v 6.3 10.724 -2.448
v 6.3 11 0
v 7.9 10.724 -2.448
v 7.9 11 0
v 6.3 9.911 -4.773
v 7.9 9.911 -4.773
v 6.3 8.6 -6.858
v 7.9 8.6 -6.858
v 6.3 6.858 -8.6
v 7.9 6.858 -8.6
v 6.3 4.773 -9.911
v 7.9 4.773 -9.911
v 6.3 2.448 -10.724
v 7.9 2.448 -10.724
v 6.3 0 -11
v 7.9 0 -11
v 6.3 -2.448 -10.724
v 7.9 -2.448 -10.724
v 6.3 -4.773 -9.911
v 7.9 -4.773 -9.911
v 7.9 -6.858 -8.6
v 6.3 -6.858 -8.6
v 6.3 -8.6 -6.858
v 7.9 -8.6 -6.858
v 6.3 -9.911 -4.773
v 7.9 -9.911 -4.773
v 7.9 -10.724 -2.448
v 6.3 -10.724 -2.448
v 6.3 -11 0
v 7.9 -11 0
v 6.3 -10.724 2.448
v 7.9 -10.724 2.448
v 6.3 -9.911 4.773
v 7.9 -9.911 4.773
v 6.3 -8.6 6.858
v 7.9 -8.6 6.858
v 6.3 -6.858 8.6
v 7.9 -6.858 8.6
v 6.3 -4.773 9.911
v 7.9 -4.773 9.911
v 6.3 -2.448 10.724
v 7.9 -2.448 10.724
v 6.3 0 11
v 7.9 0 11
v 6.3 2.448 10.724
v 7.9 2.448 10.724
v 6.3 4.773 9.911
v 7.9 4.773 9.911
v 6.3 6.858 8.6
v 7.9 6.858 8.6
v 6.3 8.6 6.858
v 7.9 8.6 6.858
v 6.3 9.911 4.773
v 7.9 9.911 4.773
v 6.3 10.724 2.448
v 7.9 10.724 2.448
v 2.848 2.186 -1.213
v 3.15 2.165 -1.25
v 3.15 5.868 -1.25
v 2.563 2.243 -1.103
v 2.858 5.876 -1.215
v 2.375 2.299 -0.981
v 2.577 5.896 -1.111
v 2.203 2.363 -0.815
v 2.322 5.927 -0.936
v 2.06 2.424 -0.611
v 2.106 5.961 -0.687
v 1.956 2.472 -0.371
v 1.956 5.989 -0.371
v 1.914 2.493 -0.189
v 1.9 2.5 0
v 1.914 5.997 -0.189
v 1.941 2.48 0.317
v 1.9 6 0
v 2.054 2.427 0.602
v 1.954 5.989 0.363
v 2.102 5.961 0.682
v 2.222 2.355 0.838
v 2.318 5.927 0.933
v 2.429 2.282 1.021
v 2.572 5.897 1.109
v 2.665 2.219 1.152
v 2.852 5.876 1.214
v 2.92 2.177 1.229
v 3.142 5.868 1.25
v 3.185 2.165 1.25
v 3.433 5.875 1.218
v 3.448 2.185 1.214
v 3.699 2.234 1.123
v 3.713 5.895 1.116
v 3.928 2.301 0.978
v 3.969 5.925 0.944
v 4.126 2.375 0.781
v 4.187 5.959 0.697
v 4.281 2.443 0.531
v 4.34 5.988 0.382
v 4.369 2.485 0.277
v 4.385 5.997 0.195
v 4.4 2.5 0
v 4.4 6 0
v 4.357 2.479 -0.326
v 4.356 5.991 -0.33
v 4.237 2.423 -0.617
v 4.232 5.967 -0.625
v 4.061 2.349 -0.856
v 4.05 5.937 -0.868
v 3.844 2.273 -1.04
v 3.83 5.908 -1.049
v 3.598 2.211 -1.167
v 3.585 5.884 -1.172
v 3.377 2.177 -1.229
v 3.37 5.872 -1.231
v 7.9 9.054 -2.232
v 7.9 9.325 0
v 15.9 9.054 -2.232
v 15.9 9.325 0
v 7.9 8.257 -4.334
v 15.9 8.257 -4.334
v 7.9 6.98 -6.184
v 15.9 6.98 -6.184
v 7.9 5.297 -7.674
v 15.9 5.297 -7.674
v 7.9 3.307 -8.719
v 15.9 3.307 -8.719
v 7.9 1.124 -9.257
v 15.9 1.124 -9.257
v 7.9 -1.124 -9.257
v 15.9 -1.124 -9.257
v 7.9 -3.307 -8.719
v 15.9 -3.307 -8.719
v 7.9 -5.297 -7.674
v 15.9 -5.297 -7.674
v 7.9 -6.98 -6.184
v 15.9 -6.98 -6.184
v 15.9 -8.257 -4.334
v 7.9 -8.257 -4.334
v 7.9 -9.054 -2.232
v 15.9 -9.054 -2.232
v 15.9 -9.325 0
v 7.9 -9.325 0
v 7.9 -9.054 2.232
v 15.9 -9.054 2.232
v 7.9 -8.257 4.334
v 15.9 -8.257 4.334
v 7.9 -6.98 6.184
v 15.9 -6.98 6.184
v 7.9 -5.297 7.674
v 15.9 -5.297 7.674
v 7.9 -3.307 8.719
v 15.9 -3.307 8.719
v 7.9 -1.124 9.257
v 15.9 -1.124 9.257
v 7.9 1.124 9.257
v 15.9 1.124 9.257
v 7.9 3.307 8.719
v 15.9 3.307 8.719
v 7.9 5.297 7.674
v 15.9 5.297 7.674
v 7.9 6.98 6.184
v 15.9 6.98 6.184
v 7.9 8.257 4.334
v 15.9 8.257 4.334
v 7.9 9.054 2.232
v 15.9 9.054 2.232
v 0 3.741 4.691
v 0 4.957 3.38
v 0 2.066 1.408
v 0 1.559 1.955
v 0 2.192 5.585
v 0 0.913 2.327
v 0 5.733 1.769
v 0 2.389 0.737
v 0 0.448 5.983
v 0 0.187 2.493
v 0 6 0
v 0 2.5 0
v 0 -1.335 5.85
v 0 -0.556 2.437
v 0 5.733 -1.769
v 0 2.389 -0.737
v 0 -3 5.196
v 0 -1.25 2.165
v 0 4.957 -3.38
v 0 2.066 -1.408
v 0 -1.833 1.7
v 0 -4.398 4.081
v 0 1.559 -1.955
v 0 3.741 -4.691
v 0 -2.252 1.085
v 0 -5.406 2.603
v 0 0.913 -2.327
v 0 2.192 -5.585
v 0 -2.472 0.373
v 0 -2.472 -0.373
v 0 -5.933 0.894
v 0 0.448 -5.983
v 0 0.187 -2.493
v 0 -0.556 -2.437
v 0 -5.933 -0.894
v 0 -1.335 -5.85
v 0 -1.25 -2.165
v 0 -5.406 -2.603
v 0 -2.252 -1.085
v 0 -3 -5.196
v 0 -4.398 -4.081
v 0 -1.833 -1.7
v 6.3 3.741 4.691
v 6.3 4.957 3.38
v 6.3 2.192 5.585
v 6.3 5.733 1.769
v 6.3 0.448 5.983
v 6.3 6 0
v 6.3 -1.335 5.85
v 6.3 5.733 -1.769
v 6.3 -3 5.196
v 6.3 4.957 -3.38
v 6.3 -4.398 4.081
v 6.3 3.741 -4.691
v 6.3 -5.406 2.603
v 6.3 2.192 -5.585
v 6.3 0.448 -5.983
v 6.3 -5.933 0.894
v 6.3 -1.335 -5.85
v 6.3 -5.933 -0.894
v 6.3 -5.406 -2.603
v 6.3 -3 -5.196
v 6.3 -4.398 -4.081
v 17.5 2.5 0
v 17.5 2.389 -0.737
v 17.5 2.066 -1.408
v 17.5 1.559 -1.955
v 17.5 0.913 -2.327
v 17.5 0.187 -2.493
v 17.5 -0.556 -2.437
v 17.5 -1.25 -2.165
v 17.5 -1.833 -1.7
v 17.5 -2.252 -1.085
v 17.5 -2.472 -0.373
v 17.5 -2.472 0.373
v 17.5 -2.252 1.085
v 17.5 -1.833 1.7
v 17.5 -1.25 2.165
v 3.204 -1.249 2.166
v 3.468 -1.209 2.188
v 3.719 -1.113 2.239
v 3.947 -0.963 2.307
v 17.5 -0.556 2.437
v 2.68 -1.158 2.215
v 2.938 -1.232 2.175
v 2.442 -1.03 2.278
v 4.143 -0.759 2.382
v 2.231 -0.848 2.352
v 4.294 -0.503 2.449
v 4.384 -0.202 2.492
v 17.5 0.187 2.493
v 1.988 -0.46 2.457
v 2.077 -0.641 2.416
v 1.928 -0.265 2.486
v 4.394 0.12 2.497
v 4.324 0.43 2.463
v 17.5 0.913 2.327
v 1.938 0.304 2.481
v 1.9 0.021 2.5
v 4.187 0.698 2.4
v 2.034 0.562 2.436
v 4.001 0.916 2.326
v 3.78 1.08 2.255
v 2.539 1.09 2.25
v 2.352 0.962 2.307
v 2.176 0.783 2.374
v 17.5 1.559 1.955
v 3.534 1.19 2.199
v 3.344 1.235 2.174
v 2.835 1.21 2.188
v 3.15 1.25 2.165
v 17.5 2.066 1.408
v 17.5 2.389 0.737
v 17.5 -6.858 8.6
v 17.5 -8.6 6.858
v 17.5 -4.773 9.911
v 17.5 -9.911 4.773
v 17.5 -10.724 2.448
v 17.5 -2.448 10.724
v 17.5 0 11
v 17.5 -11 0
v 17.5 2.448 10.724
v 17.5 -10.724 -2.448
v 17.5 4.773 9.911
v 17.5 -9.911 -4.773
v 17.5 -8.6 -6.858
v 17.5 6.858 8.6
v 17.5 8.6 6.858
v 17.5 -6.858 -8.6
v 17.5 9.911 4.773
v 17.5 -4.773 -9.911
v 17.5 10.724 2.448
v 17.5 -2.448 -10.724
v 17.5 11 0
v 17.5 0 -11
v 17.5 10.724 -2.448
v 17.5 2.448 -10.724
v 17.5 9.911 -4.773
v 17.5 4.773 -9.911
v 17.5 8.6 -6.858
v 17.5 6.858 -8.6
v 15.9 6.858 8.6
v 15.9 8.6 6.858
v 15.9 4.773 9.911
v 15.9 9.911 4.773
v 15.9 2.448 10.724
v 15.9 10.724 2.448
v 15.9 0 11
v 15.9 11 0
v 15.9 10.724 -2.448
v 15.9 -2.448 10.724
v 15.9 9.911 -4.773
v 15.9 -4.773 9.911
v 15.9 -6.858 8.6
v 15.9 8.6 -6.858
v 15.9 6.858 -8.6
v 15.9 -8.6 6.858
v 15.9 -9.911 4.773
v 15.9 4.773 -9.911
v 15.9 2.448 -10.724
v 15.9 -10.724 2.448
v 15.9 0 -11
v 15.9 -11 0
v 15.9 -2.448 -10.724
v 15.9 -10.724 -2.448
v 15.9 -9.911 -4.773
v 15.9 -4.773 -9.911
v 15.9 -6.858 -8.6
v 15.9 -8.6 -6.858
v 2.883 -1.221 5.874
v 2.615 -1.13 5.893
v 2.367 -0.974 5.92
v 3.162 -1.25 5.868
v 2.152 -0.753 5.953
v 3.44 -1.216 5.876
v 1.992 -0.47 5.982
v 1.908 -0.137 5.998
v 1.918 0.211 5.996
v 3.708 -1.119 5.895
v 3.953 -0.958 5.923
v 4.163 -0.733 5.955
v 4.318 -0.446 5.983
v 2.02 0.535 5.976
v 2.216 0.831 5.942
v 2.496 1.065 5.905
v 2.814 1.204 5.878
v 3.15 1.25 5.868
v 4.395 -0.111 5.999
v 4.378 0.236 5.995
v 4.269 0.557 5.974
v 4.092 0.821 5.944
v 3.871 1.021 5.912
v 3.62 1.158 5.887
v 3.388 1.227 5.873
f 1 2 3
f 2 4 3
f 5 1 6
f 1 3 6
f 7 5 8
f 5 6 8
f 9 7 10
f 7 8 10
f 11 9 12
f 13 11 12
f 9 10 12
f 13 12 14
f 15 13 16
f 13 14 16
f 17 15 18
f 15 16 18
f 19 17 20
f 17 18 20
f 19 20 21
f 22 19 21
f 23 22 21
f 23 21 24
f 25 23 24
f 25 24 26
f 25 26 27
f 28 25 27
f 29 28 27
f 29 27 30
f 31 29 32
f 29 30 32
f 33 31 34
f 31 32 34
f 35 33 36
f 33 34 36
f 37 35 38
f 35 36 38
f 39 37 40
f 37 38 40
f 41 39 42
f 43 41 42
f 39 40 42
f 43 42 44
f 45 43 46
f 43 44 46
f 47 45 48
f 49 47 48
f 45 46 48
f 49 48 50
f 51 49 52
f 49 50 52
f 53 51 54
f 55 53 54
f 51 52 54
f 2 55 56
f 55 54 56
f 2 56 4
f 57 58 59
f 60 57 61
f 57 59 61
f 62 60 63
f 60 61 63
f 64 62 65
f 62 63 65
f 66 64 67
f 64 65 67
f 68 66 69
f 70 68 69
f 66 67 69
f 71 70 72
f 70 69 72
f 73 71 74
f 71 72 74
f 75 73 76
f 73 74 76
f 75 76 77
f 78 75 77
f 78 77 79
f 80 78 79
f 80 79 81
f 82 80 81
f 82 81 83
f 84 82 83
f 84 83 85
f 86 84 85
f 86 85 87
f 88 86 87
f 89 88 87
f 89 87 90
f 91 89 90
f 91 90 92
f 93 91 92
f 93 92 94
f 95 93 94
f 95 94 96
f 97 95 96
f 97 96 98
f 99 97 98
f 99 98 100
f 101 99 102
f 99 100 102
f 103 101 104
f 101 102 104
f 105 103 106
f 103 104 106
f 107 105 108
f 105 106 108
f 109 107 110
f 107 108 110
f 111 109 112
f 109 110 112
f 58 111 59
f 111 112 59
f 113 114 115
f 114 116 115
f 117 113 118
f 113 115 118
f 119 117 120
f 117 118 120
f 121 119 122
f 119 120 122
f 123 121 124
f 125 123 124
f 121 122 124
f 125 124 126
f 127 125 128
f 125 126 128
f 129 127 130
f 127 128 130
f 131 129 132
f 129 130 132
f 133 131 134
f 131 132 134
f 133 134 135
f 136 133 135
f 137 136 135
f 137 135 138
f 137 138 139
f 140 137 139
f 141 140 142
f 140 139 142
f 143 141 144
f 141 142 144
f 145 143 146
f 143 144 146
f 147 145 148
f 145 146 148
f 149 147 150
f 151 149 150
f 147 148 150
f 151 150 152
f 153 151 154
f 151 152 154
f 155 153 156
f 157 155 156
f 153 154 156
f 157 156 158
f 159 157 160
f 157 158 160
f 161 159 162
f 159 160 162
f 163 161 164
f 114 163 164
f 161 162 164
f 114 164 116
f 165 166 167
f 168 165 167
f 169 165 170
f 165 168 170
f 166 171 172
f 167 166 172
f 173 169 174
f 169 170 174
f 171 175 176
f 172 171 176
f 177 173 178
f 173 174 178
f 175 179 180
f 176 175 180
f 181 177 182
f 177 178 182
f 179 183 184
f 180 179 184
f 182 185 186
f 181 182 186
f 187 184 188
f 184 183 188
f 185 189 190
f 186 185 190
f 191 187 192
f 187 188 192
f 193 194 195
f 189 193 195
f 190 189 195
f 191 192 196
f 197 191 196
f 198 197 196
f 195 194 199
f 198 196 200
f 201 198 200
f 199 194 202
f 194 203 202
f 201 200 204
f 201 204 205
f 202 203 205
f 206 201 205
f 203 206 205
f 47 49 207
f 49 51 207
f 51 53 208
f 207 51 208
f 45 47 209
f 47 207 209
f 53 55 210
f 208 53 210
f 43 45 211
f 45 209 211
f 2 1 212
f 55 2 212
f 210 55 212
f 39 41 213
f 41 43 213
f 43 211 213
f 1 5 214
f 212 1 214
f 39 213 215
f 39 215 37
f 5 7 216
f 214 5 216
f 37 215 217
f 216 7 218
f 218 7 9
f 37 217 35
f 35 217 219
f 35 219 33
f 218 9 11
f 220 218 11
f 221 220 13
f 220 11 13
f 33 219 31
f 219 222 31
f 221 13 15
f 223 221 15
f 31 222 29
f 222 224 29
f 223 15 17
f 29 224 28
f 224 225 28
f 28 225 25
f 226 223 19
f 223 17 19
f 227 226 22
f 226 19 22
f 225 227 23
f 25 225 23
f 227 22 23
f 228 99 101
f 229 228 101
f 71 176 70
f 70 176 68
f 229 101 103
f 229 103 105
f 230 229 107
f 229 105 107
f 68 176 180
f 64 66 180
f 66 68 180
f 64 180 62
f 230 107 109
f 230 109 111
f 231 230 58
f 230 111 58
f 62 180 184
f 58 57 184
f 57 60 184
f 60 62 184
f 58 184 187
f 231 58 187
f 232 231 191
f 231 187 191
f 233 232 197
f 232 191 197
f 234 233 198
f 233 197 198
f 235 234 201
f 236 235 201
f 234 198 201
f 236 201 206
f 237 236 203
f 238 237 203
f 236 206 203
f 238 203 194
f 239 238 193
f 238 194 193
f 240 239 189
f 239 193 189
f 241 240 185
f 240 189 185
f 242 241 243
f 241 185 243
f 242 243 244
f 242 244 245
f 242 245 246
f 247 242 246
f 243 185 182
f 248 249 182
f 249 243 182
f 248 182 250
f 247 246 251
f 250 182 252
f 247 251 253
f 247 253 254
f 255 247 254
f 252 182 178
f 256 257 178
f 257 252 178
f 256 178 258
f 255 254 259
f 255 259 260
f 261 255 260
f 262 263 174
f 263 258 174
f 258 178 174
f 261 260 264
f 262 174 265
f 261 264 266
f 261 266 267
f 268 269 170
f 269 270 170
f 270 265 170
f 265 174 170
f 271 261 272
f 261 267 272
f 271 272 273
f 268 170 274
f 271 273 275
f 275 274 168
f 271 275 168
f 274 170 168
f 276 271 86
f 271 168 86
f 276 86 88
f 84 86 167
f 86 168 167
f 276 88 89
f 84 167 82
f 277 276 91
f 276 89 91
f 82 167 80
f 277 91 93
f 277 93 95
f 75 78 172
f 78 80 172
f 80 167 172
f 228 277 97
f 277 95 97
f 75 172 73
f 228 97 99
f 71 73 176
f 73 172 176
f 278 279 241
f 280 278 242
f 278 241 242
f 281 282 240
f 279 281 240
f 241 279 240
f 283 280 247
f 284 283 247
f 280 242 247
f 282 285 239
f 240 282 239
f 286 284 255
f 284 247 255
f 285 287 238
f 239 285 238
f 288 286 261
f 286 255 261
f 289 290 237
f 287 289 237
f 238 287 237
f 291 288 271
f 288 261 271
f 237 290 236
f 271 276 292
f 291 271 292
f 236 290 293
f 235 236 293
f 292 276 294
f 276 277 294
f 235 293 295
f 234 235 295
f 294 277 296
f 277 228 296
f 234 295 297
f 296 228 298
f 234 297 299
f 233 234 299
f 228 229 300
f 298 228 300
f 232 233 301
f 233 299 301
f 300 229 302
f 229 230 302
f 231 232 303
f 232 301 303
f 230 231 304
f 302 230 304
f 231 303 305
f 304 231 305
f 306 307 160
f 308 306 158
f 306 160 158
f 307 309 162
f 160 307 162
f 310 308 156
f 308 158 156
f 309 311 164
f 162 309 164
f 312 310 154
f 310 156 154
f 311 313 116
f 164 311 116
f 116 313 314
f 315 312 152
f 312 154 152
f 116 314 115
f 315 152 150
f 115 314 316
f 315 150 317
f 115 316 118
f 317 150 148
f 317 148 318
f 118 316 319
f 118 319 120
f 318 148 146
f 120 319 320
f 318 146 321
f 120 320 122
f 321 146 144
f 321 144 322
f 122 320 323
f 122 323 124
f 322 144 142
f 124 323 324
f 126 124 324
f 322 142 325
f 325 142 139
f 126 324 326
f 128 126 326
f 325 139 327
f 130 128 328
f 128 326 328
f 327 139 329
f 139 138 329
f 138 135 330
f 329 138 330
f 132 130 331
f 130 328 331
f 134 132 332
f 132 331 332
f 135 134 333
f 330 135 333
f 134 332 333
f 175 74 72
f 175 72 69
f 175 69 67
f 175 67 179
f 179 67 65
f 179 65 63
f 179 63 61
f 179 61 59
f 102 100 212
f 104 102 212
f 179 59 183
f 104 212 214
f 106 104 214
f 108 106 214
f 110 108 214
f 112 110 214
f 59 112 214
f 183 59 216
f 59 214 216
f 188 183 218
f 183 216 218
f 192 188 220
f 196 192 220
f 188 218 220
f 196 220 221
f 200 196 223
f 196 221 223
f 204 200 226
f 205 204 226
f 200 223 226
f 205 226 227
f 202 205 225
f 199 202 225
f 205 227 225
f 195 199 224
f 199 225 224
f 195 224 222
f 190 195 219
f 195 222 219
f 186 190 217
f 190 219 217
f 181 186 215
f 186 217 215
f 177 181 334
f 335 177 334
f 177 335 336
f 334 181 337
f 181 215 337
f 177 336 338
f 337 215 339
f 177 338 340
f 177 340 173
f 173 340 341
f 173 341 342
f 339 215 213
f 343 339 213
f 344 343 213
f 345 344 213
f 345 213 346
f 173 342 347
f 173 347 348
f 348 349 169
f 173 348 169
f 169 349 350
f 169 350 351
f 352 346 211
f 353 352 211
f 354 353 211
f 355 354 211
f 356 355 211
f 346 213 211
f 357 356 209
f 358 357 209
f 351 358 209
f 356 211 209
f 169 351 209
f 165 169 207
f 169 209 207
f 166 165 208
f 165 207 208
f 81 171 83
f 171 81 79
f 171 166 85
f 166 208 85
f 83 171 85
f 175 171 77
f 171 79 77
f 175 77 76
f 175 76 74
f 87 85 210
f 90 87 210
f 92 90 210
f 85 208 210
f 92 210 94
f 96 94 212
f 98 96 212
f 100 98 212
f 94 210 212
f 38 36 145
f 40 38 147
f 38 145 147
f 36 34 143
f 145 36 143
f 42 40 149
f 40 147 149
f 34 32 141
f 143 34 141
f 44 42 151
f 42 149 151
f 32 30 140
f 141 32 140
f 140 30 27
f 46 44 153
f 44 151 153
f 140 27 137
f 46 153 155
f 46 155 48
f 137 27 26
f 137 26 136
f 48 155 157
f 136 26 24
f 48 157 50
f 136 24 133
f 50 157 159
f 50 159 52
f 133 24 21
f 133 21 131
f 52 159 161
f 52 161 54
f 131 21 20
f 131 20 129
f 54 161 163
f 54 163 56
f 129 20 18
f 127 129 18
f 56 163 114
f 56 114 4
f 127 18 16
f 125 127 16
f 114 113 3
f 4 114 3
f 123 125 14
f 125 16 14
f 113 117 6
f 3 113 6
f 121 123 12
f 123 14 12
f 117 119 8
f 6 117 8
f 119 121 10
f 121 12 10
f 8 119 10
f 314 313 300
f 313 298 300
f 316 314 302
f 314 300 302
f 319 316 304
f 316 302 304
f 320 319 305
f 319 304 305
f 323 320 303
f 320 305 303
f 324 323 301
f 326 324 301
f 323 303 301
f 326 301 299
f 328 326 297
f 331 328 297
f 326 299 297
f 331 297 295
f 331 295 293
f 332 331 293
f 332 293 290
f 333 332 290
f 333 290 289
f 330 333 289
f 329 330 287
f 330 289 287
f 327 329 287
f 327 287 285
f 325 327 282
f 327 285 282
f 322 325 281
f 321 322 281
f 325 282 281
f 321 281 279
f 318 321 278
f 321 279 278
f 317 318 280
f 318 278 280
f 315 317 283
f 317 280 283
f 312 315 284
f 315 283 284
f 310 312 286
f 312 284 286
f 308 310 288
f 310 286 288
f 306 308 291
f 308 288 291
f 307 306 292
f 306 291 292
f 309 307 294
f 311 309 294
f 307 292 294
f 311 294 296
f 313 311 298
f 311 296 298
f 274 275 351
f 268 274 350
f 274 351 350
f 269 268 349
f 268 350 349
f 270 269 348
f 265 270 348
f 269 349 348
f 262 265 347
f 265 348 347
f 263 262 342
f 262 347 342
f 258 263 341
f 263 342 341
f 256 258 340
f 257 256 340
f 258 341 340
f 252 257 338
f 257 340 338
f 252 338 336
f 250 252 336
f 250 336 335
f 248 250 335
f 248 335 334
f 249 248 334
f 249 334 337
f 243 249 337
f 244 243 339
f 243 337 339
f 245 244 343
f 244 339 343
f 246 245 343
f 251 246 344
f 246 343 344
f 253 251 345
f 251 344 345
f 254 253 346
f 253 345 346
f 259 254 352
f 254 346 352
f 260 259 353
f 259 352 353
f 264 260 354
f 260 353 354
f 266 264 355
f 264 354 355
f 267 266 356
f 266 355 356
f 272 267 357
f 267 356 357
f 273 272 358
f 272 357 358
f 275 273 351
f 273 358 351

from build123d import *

# Parameters (mm, degrees)
SKETCH2_W = 1.25
SKETCH2_H = 11
SKETCH4_W = 1.25
SKETCH4_H = 11


with BuildPart() as part:
    # Sketch1 → Revolve1 (revolve)
    with BuildSketch(Plane.XY):
        Polygon((0, 2.5), (0, 6), (6.3, 6), (6.3, 11), (7.9, 11), (7.9, 9.325), (15.9, 9.325), (15.9, 11), (17.5, 11), (17.5, 2.5), align=None)
    revolve(axis=Axis((0, 0, 0), (-1, 0, 0)))

    # Sketch2 → M3x0.5 Tapped Hole1 (revolve, cut)
    with BuildSketch(Plane(origin=(3.15, 0, 0), x_dir=(0, 0, -1), z_dir=(1, 0, 0))):
        with Locations((0.625, 5.5)):
            Rectangle(SKETCH2_W, SKETCH2_H)
    revolve(axis=Axis((3.15, -6.35, 0), (0, 1, 0)), mode=Mode.SUBTRACT)

    # Sketch4 → M3x0.5 Tapped Hole2 (revolve, cut)
    with BuildSketch(Plane.YZ.offset(3.15)):
        with Locations((0.625, 5.5)):
            Rectangle(SKETCH4_W, SKETCH4_H)
    revolve(axis=Axis((3.15, 0, -6.35), (0, 0, 1)), mode=Mode.SUBTRACT)


solid = part.part
